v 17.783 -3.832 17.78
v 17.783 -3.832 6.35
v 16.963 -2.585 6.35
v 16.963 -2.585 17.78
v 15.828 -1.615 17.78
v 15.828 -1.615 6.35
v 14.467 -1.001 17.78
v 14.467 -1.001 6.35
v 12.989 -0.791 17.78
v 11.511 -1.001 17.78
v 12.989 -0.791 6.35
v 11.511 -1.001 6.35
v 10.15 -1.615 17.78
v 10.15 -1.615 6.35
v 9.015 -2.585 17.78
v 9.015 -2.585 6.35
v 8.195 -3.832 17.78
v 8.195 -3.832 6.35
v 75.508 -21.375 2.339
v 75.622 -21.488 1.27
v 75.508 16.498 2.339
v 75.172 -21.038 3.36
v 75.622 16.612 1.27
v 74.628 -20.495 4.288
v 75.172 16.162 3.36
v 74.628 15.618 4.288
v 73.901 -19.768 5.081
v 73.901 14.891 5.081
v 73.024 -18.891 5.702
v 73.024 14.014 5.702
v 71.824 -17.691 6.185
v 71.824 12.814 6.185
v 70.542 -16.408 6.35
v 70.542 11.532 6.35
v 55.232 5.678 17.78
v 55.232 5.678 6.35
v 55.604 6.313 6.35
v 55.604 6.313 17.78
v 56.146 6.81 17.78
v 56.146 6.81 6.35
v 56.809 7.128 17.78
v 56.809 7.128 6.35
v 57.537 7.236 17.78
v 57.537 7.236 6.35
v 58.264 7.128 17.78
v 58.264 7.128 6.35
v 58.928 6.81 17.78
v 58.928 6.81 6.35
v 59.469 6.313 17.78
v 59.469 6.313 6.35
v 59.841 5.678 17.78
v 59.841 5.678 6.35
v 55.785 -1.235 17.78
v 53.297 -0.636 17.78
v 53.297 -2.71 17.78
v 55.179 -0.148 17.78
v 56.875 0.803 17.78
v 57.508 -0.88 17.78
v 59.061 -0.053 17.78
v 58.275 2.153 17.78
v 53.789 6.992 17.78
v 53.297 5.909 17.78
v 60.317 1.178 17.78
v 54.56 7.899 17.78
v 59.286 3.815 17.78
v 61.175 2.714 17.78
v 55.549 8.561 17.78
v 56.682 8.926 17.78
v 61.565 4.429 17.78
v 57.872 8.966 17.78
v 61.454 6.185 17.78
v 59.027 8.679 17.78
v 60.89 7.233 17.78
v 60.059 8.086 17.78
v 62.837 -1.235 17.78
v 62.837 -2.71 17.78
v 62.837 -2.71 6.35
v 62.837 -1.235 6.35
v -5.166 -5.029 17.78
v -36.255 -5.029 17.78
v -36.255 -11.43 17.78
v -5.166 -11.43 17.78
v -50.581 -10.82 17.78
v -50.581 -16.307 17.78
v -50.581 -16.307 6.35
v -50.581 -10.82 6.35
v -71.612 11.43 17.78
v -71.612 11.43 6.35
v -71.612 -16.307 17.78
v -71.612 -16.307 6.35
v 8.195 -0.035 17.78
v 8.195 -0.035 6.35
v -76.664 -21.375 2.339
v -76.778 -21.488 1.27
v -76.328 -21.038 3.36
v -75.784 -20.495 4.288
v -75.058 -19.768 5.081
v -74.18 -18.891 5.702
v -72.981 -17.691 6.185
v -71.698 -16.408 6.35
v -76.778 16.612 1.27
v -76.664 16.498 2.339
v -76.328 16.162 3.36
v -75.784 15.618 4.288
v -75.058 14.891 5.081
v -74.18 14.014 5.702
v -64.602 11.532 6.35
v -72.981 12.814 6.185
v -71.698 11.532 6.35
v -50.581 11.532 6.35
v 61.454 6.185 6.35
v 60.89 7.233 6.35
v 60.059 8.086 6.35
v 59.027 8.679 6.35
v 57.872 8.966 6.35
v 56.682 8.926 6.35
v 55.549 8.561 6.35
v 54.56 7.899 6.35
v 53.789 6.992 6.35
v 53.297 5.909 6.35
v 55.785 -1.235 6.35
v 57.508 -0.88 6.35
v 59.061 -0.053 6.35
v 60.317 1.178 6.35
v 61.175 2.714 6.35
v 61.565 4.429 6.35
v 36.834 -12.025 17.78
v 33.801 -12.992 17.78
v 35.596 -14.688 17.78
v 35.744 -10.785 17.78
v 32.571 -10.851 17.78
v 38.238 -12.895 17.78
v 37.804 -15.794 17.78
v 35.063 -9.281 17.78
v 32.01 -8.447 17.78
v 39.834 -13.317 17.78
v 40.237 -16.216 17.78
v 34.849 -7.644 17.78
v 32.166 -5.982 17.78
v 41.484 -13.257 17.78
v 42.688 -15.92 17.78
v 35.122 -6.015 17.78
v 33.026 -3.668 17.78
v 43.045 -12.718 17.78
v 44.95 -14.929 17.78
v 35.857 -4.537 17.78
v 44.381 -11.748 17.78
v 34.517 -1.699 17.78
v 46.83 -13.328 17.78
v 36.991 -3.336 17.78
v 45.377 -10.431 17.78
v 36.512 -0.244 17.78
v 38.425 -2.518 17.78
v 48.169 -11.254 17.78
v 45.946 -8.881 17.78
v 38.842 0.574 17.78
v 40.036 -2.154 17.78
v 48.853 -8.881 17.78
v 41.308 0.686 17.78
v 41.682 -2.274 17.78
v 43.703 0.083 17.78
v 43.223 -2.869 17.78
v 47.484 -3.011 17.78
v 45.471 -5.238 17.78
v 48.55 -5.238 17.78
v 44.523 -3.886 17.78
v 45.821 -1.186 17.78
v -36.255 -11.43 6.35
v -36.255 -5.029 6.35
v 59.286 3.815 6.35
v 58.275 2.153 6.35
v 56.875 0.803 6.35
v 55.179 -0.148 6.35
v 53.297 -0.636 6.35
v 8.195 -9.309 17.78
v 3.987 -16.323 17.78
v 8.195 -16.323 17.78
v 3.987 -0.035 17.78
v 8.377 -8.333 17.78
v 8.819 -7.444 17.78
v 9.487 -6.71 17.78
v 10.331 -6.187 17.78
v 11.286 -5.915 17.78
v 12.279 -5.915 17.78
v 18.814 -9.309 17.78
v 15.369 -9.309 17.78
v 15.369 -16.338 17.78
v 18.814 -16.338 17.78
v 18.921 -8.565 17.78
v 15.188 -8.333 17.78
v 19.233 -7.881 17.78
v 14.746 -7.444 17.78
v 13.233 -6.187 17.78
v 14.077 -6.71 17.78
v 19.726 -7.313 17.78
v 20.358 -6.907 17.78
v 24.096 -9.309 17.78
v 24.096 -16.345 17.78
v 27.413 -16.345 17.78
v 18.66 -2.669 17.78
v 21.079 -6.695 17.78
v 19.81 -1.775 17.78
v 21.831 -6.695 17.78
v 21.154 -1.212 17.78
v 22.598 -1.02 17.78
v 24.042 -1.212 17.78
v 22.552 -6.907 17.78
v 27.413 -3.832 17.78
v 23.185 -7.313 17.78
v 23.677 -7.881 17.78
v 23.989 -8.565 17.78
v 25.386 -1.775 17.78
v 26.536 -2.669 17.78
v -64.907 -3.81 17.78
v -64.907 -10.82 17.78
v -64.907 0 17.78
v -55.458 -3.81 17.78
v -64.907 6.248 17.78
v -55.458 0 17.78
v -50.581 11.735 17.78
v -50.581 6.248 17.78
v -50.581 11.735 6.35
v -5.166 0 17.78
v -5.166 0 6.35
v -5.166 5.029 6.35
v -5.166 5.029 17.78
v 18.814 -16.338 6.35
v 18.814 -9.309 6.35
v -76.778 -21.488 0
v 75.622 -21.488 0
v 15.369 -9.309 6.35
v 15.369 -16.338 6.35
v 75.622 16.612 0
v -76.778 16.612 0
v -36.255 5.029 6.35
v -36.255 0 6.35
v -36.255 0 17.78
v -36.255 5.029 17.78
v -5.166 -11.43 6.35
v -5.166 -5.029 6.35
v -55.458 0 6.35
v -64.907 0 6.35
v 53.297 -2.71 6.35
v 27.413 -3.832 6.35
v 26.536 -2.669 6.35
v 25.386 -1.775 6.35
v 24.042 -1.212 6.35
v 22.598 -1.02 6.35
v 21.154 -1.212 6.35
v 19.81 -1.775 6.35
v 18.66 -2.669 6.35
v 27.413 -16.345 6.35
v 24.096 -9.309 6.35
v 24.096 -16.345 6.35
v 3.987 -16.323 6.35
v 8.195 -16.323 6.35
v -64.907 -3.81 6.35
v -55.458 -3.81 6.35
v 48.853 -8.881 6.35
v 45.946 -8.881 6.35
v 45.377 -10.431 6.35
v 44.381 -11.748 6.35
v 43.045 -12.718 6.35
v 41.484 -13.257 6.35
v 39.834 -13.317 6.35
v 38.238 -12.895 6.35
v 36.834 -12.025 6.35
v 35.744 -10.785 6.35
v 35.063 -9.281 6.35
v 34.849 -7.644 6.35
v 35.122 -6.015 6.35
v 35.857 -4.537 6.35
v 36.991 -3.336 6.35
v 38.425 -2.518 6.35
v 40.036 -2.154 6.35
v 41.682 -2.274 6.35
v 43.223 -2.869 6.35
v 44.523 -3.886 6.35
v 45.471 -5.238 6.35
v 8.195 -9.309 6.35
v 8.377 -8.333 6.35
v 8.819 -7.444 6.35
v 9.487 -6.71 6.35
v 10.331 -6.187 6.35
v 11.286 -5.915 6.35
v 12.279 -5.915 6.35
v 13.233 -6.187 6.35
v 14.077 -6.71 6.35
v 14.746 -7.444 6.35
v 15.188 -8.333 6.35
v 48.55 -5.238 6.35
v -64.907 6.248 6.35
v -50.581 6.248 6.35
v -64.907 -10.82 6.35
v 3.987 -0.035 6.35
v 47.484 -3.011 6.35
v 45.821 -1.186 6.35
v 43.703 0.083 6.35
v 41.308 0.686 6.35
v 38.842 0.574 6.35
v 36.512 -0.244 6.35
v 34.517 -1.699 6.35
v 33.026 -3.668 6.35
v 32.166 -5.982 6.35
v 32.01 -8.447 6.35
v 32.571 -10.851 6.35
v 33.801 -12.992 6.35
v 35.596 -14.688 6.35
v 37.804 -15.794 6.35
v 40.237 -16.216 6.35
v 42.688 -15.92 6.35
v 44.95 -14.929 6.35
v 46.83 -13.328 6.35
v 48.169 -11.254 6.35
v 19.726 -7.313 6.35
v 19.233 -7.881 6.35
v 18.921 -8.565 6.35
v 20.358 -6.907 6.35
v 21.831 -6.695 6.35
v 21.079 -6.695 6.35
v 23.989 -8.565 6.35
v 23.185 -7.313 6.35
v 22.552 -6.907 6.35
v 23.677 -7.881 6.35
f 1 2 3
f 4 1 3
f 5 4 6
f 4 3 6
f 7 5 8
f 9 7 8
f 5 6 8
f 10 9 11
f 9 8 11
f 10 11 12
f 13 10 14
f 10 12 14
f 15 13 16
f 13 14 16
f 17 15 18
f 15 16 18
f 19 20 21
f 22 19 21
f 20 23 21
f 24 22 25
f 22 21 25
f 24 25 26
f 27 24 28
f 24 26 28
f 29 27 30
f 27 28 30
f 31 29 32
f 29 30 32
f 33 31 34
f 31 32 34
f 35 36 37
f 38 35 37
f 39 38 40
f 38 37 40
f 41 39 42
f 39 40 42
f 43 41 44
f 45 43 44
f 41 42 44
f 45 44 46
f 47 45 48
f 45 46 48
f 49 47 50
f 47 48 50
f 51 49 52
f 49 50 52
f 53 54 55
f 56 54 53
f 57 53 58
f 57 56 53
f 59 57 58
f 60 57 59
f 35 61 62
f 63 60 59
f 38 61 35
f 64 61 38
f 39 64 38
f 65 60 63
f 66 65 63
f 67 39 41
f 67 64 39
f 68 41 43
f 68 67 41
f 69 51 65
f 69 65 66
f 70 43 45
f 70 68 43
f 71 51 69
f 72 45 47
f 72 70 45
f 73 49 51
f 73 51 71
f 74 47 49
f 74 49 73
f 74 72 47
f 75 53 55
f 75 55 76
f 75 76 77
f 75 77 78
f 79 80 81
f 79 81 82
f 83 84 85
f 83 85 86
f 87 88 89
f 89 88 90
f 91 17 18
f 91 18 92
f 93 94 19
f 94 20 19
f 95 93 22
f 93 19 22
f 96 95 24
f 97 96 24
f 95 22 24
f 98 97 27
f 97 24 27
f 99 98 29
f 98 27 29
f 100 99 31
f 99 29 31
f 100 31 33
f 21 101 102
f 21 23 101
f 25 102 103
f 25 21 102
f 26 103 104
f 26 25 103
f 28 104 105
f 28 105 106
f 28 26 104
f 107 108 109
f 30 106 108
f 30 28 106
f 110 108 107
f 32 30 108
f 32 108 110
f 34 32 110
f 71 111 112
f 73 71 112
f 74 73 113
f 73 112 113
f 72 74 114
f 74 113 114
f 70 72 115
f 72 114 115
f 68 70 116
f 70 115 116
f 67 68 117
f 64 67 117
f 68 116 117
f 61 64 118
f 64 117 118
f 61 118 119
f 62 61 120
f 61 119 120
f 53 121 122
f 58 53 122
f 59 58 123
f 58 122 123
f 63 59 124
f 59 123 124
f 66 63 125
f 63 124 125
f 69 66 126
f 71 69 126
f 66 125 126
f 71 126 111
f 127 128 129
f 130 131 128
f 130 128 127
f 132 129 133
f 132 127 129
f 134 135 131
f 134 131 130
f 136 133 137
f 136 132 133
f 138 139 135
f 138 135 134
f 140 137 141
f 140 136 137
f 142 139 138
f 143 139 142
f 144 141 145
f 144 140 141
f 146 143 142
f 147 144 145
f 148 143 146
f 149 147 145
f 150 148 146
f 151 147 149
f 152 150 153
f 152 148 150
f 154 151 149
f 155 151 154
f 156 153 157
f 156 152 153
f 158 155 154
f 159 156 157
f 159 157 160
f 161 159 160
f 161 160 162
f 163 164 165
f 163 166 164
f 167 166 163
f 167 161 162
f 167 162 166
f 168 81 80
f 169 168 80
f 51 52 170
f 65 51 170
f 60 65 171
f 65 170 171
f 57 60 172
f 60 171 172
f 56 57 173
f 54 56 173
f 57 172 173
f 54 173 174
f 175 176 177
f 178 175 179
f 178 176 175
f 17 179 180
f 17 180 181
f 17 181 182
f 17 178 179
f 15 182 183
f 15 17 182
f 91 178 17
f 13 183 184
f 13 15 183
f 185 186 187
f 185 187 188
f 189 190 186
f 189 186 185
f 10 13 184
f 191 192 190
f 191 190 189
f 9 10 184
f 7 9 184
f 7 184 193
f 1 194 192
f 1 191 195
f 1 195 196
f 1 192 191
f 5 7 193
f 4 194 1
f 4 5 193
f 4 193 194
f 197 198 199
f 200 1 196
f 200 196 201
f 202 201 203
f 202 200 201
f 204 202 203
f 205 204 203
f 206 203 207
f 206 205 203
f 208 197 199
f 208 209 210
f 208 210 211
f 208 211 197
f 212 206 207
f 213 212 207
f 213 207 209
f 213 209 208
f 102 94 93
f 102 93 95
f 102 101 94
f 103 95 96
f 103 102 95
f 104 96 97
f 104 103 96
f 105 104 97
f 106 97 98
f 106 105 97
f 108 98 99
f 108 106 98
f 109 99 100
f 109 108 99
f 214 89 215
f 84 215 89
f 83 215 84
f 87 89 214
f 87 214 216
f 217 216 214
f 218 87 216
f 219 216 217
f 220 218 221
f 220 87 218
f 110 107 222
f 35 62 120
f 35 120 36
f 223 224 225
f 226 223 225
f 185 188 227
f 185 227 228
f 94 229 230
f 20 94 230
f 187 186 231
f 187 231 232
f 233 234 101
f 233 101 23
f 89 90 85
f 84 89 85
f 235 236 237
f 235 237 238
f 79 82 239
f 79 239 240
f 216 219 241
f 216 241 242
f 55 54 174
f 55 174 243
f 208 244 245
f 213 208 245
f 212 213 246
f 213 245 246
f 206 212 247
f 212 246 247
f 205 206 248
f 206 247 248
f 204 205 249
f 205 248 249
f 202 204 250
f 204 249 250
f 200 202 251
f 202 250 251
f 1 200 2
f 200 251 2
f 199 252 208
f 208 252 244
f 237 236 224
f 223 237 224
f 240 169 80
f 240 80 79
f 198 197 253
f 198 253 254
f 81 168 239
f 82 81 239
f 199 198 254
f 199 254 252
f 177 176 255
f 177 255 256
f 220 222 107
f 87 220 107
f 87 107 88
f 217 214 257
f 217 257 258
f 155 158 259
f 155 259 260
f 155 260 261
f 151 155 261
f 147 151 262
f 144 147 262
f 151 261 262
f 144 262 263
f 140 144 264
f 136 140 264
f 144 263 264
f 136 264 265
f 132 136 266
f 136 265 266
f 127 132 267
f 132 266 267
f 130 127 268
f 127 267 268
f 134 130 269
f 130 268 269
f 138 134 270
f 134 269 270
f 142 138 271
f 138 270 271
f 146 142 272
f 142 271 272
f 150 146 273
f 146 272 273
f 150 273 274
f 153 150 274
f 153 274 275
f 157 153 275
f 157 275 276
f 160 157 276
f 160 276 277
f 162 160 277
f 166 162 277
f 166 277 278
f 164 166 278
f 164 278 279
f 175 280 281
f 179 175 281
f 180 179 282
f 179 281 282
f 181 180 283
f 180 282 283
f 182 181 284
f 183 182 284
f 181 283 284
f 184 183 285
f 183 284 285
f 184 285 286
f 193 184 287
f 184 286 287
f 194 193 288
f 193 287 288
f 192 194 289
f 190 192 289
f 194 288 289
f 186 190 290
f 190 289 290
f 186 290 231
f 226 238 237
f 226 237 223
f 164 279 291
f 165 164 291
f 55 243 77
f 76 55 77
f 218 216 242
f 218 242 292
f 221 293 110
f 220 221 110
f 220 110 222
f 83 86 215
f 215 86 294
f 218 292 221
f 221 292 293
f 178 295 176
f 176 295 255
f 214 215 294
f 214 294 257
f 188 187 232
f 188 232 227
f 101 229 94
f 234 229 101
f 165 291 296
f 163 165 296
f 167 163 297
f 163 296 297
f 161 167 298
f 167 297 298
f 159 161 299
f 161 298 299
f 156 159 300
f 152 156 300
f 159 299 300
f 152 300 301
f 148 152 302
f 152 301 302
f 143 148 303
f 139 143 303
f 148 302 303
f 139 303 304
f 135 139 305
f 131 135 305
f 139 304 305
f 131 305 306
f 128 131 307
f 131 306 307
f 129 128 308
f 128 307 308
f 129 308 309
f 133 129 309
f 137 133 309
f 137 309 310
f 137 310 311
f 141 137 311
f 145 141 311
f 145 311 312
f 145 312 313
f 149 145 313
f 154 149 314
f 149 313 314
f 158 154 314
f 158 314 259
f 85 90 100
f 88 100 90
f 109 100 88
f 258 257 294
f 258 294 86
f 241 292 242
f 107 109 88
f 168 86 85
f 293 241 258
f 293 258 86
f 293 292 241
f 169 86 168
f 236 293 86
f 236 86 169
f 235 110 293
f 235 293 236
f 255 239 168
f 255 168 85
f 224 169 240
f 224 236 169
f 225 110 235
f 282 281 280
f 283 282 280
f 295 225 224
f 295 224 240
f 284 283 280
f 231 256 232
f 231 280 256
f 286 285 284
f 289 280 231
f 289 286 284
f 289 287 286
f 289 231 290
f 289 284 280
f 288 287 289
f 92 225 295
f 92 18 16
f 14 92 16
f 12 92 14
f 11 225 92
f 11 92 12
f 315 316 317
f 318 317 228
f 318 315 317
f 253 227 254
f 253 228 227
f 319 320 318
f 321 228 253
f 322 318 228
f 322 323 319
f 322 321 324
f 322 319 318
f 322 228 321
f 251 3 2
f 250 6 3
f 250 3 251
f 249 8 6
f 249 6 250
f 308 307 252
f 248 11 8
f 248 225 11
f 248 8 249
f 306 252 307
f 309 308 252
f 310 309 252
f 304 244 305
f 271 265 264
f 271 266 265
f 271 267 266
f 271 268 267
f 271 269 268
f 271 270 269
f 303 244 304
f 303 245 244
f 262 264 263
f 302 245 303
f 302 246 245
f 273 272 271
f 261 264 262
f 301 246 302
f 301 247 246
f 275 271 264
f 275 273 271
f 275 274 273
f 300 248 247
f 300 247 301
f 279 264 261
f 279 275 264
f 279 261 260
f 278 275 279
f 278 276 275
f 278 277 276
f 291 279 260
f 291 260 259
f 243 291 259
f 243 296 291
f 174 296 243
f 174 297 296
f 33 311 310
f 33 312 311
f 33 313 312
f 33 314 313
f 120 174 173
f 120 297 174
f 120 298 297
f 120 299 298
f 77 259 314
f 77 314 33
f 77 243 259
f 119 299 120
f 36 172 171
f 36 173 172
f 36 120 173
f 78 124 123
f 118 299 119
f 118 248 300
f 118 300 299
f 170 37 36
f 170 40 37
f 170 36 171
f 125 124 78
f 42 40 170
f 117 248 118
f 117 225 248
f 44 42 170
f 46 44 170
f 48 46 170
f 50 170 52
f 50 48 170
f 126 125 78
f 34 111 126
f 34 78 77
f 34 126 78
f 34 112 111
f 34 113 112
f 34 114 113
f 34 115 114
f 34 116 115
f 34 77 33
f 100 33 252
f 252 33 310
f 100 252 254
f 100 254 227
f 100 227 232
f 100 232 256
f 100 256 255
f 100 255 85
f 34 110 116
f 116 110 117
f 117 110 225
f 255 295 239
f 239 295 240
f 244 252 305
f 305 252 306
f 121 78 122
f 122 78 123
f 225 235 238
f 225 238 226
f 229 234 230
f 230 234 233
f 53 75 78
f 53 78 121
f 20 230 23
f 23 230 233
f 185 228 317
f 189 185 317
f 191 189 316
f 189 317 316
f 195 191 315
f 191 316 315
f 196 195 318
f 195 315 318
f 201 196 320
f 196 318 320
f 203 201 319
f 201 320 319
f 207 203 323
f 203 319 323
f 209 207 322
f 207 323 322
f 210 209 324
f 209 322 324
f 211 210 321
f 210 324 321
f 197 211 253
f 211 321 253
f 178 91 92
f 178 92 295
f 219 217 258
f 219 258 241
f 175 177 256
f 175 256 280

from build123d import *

# Parameters (mm, degrees)
F0_W      = 152.4
F0_H      = 38.1
F1_DEPTH  = 6.35
F2_R      = 5.08
F4_DEPTH  = 11.43
F5_W      = 31.0896
F5_H      = 5.0292
F5_H_2    = 6.400801
F6_DEPTH  = 11.43
F8_DEPTH  = 11.43
F10_DEPTH = 11.43
F12_DEPTH = 11.43


with BuildPart() as f1:
    # F0 (on Top) → F1 (new body)
    with BuildSketch(Plane.XY):
        with Locations((-0.578179, -2.4384)):
            Rectangle(F0_W, F0_H)
    extrude(amount=F1_DEPTH)

    # F2
    f2_edges = [f1.edges().sort_by_distance(p)[0] for p in [
        (-0.578179, 16.6116, 6.35),
        (-76.778179, -2.4384, 6.35),
        (-0.578179, -21.4884, 6.35),
        (75.621821, -2.4384, 6.35),
    ]]
    fillet(f2_edges, radius=F2_R)

    # F3 (on face) → F4 (join)
    with BuildSketch(Plane.XY.offset(6.35)):
        Polygon((-50.58109, 11.734799), (-71.612291, 11.430001), (-71.612291, -16.306801), (-50.58109, -16.306801), (-50.58109, -10.8204), (-64.906694, -10.8204), (-64.906694, -3.81), (-55.45789, -3.81), (-55.45789, 0), (-64.906694, 0), (-64.906694, 6.2484), (-50.58109, 6.2484), align=None)
    extrude(amount=F4_DEPTH)

    # F5 (on face) → F6 (join)
    with BuildSketch(Plane.XY.offset(6.35)):
        with Locations((-20.71069, 2.5146)):
            Rectangle(F5_W, F5_H)
        with Locations((-20.71069, -8.229601)):
            Rectangle(F5_W, F5_H_2)
    extrude(amount=F6_DEPTH)

    # F7 (on face) → F8 (join)
    with BuildSketch(Plane.XY.offset(6.35)):
        with BuildLine():
            Line((3.987037, -0.034714), (3.987037, -16.323045))
            Line((3.987037, -16.323045), (8.195101, -16.323045))
            Line((8.195101, -16.323045), (8.195101, -9.309177))
            ThreePointArc((8.195101, -9.309177), (11.782139, -5.880751), (15.369177, -9.309177))
            Line((15.369177, -9.309177), (15.369177, -16.338116))
            Line((15.369177, -16.338116), (18.81415, -16.338116))
            Line((18.81415, -16.338116), (18.81415, -9.309177))
            ThreePointArc((18.81415, -9.309177), (21.455294, -6.668033), (24.096439, -9.309177))
            Line((24.096439, -9.309177), (24.096439, -16.345294))
            Line((24.096439, -16.345294), (27.413206, -16.345294))
            Line((27.413206, -16.345294), (27.413206, -3.832139))
            ThreePointArc((27.413206, -3.832139), (22.598146, -1.020168), (17.783085, -3.832139))
            ThreePointArc((17.783085, -3.832139), (12.989093, -0.790731), (8.195101, -3.832139))
            Line((8.195101, -3.832139), (8.195101, -0.034714))
            Line((8.195101, -0.034714), (3.987037, -0.034714))
        make_face()
    extrude(amount=F8_DEPTH)

    # F9 (on face) → F10 (join)
    with BuildSketch(Plane.XY.offset(6.35)):
        with BuildLine():
            Line((45.470758, -5.2382), (48.550447, -5.2382))
            ThreePointArc((48.550447, -5.2382), (32.01016, -8.446661), (48.853159, -8.881086))
            Line((48.853159, -8.881086), (45.94597, -8.881086))
            ThreePointArc((45.94597, -8.881086), (34.895535, -8.47017), (45.470758, -5.2382))
        make_face()
    extrude(amount=F10_DEPTH)

    # F11 (on face) → F12 (join)
    with BuildSketch(Plane.XY.offset(6.35)):
        with BuildLine():
            ThreePointArc((55.785455, -1.235234), (60.317074, 1.178317), (61.454367, 6.185049))
            ThreePointArc((61.454367, 6.185049), (57.275841, 8.987166), (53.296663, 5.908517))
            Line((53.296663, 5.908517), (55.232391, 5.678073))
            ThreePointArc((55.232391, 5.678073), (57.536826, 7.236442), (59.84126, 5.678073))
            ThreePointArc((59.84126, 5.678073), (57.618597, 1.433053), (53.296663, -0.63608))
            Line((53.296663, -0.63608), (53.296663, -2.710072))
            Line((53.296663, -2.710072), (62.837027, -2.710072))
            Line((62.837027, -2.710072), (62.837027, -1.235234))
            Line((62.837027, -1.235234), (55.785455, -1.235234))
        make_face()
    extrude(amount=F12_DEPTH)


solid = f1.part
